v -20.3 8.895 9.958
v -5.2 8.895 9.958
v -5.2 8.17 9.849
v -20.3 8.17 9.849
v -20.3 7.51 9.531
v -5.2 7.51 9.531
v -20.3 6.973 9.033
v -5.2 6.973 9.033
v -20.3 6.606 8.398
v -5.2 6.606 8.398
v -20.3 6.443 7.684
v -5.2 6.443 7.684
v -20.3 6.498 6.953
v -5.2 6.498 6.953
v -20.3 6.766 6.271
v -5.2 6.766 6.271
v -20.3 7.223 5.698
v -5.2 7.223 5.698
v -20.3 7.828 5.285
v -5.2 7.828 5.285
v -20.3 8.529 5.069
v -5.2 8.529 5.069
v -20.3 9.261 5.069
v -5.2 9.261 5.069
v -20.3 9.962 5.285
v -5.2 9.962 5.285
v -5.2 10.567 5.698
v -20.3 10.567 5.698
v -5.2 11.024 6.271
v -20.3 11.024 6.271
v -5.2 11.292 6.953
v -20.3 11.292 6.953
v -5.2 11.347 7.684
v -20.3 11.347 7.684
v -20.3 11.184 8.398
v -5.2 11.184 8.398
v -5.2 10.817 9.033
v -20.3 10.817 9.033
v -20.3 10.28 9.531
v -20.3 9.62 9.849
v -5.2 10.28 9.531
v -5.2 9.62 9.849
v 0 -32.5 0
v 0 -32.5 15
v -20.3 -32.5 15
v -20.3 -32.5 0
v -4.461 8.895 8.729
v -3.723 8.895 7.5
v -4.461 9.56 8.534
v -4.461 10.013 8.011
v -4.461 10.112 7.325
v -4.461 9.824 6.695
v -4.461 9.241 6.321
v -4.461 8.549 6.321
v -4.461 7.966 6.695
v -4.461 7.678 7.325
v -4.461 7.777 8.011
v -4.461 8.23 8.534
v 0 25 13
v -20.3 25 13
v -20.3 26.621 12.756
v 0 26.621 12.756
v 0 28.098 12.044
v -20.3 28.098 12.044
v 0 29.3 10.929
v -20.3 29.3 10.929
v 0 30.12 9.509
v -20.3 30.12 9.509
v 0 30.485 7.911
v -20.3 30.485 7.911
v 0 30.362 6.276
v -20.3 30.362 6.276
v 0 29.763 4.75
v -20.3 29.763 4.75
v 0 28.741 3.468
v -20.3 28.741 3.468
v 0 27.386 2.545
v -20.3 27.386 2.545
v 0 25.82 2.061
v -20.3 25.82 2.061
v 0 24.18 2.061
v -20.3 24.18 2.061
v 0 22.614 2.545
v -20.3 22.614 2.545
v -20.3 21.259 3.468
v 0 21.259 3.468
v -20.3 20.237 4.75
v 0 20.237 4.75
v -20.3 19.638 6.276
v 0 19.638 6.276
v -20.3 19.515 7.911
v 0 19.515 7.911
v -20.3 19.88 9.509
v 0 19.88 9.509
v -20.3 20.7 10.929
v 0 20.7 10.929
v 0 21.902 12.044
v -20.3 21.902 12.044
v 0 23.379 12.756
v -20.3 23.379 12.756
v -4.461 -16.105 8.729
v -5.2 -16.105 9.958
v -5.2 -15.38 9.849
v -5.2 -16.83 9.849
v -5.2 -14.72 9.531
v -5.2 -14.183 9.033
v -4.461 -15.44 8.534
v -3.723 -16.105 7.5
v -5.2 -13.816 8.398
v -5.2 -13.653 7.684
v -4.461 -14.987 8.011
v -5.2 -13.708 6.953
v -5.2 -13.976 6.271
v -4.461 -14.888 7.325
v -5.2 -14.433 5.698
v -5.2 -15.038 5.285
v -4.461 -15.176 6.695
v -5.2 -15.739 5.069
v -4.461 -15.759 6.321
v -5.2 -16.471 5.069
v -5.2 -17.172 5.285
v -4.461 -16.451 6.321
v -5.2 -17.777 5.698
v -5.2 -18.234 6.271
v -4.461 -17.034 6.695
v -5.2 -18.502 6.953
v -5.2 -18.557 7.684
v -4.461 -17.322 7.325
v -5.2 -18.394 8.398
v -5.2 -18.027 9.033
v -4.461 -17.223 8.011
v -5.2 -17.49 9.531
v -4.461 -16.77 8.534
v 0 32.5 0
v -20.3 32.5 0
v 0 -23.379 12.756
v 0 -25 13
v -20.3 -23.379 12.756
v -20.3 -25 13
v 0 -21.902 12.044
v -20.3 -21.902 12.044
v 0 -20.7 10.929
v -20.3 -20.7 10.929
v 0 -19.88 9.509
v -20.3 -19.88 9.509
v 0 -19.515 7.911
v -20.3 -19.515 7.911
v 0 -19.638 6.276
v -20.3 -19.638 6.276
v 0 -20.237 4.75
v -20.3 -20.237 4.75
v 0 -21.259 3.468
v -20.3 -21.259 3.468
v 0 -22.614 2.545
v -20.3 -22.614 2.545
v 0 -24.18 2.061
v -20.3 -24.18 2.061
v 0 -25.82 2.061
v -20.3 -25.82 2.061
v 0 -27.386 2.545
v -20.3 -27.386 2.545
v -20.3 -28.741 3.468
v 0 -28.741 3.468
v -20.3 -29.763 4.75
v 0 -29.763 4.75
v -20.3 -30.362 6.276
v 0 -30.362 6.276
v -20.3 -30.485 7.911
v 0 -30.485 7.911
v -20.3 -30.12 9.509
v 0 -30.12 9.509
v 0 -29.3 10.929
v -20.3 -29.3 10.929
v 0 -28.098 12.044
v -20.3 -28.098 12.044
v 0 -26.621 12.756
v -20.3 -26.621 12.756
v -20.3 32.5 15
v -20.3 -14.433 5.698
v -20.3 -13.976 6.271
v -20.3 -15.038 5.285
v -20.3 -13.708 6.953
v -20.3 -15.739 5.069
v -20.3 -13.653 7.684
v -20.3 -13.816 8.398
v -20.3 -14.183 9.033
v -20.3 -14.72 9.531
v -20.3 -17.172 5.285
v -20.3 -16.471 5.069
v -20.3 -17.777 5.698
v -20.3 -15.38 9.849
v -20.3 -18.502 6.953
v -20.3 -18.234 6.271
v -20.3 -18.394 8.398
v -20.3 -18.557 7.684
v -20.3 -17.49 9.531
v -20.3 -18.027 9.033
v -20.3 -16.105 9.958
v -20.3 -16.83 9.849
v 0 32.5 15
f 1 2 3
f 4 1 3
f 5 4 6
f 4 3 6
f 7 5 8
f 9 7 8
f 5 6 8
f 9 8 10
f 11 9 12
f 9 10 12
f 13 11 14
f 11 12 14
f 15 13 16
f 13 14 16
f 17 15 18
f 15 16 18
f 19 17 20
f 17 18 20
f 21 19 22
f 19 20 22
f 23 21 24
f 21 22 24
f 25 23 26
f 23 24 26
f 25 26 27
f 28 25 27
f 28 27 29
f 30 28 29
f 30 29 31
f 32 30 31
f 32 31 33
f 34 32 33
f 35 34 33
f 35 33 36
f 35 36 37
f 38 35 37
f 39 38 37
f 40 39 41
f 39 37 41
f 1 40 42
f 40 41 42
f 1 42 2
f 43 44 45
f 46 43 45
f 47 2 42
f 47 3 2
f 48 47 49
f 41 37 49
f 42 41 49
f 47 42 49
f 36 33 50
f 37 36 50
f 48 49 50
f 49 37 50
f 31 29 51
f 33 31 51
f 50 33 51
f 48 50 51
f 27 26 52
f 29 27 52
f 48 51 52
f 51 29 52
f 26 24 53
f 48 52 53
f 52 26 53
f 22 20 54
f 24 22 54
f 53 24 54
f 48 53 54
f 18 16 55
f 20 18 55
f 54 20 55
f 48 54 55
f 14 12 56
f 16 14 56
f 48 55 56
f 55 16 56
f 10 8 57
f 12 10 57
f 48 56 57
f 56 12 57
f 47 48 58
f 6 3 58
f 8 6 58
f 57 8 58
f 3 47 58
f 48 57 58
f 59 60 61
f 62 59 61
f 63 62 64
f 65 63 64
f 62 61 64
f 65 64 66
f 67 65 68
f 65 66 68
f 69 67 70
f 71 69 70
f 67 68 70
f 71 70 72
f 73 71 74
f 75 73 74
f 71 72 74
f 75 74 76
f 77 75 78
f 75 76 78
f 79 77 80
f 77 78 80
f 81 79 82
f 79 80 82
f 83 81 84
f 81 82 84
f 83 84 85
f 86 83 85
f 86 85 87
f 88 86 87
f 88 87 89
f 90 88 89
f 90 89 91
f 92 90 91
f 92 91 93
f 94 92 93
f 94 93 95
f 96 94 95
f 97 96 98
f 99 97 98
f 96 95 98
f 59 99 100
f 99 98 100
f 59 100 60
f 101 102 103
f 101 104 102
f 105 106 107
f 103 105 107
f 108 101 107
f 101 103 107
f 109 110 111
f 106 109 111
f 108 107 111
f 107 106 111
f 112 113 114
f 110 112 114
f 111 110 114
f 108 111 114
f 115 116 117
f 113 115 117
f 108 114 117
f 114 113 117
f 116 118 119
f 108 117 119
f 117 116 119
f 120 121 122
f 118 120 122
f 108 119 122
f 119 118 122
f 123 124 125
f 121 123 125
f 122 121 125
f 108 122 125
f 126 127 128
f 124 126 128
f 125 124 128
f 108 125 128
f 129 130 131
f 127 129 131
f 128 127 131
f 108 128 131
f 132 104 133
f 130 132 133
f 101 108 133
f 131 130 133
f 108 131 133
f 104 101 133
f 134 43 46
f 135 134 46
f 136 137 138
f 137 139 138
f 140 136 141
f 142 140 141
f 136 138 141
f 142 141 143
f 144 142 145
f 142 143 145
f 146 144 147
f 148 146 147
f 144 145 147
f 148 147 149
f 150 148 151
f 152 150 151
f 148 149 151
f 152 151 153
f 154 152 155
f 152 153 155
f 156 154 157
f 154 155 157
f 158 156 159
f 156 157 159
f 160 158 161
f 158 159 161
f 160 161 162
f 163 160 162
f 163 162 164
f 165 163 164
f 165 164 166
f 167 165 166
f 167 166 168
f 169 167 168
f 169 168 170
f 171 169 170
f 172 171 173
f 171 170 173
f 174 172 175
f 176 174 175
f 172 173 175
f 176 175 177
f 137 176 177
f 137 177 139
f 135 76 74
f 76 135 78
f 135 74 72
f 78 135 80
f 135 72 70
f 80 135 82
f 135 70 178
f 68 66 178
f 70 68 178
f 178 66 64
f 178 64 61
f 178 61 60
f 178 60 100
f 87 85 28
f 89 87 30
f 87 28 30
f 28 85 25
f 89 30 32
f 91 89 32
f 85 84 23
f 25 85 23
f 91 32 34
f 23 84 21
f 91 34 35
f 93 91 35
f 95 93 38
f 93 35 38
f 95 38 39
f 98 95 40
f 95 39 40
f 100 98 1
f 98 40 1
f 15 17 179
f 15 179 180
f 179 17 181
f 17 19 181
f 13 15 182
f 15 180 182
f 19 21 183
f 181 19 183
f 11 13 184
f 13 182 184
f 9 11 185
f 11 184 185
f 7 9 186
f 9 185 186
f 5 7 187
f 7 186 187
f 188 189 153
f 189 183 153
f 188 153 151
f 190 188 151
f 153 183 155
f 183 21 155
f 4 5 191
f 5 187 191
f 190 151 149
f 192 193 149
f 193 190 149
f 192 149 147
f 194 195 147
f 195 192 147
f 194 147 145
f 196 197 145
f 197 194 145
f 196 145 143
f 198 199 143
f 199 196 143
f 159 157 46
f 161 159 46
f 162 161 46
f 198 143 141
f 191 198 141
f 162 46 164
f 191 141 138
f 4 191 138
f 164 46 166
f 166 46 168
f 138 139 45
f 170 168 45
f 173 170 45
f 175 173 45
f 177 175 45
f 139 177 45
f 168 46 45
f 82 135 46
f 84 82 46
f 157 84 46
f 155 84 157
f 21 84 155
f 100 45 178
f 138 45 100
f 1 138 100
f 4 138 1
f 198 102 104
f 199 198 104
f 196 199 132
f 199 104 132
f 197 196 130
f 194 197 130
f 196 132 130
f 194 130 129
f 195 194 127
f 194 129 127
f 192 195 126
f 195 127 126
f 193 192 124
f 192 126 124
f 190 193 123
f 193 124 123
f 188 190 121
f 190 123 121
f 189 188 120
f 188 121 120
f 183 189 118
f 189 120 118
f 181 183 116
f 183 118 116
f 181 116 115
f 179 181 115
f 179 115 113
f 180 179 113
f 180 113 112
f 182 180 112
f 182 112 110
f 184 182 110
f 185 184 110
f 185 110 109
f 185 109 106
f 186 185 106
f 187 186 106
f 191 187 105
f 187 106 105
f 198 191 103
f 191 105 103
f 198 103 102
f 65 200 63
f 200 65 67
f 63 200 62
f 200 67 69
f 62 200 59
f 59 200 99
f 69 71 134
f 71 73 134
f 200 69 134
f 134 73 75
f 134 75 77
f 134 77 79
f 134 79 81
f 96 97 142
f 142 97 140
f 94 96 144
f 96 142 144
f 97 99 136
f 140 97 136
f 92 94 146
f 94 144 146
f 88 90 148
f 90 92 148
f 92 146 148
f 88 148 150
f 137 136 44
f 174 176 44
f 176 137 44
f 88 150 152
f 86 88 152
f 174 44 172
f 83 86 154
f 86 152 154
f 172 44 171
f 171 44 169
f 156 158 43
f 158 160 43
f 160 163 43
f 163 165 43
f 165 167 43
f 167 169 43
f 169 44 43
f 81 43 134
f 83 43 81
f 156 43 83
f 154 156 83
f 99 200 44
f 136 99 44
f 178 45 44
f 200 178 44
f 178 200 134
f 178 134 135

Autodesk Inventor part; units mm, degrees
ref_plane "YZ Plane" through (0, 0, 0) normal (1, 0, 0) x (0, 1, 0)
ref_plane "XZ Plane" through (0, 0, 0) normal (0, 1, 0) x (-1, 0, 0)
ref_plane "XY Plane" through (0, 0, 0) normal (0, 0, 1) x (1, 0, 0)
sketch "Sketch1" plane through (0, 0, 0) normal (0, 1, 0) x (-1, 0, 0)
  line L0 (0, 0) -> (20.3, 0)
  line L1 (20.3, 0) -> (20.3, 15)
  line L2 (20.3, 15) -> (0, 15)
  line L3 (0, 15) -> (0, 0)
  dimension "d0" = 15
  dimension "d1" = 20.3
extrude "Extrusion1" add sketch "Sketch1" along normal mid plane 65
sketch "Sketch2" plane through (-20.3, -32.5, 15) normal (-1, 0, 0) x (0, 0, 1)
  circle A0 centre (-7.5, 7.5) radius 3.25
  circle A1 centre (-7.5, 57.5) radius 3.25
  circle A2 centre (-7.5, 7.5) radius 5.5
  circle A3 centre (-7.5, 57.5) radius 5.5
  line L0 (0, 0) -> (-15, 0) projected
  line L1 (-15, 32.5) -> (12.3047, 32.5) construction
  dimension "d4" = 6.5
  dimension "d5" = 6.5
  dimension "d8" = 11
  dimension "d9" = 11
  dimension "d26" = 25
  dimension "d27" = 25
extrude "Extrusion2" cut sketch "Sketch2" against normal through all contours A0 | A1
extrude "Extrusion3" cut sketch "Sketch2" against normal blind 21.3
sketch "Sketch3" plane through (-20.3, -32.5, 15) normal (-1, 0, 0) x (0, 0, 1)
  circle A0 centre (-7.5, 16.395) radius 3
  line L0 (0, 0) -> (-15, 0) projected
  circle A1 centre (-7.5, 41.395) radius 3
  point P0 (-15, 32.5)
  dimension "d14" = 6
  dimension "d22" = 16.395
  dimension "d23" = 6
  dimension "d24" = 25
hole "Hole1" at (-20.3, -16.105, 7.5) at (-20.3, 8.895, 7.5) direction (1, 0, 0) diameter 4.917 depth 15.1 tip angle 118 thread size "M6x1" class "6H" standard "ANSI Metric M Profile"
sketch "Sketch4" plane through (-20.3, -32.5, 15) normal (-1, 0, 0) x (0, 0, 1)
  point P0 (-15, 32.5)
properties part number "HeadbarHolderBracket_v2" material "Aluminum 6061"
